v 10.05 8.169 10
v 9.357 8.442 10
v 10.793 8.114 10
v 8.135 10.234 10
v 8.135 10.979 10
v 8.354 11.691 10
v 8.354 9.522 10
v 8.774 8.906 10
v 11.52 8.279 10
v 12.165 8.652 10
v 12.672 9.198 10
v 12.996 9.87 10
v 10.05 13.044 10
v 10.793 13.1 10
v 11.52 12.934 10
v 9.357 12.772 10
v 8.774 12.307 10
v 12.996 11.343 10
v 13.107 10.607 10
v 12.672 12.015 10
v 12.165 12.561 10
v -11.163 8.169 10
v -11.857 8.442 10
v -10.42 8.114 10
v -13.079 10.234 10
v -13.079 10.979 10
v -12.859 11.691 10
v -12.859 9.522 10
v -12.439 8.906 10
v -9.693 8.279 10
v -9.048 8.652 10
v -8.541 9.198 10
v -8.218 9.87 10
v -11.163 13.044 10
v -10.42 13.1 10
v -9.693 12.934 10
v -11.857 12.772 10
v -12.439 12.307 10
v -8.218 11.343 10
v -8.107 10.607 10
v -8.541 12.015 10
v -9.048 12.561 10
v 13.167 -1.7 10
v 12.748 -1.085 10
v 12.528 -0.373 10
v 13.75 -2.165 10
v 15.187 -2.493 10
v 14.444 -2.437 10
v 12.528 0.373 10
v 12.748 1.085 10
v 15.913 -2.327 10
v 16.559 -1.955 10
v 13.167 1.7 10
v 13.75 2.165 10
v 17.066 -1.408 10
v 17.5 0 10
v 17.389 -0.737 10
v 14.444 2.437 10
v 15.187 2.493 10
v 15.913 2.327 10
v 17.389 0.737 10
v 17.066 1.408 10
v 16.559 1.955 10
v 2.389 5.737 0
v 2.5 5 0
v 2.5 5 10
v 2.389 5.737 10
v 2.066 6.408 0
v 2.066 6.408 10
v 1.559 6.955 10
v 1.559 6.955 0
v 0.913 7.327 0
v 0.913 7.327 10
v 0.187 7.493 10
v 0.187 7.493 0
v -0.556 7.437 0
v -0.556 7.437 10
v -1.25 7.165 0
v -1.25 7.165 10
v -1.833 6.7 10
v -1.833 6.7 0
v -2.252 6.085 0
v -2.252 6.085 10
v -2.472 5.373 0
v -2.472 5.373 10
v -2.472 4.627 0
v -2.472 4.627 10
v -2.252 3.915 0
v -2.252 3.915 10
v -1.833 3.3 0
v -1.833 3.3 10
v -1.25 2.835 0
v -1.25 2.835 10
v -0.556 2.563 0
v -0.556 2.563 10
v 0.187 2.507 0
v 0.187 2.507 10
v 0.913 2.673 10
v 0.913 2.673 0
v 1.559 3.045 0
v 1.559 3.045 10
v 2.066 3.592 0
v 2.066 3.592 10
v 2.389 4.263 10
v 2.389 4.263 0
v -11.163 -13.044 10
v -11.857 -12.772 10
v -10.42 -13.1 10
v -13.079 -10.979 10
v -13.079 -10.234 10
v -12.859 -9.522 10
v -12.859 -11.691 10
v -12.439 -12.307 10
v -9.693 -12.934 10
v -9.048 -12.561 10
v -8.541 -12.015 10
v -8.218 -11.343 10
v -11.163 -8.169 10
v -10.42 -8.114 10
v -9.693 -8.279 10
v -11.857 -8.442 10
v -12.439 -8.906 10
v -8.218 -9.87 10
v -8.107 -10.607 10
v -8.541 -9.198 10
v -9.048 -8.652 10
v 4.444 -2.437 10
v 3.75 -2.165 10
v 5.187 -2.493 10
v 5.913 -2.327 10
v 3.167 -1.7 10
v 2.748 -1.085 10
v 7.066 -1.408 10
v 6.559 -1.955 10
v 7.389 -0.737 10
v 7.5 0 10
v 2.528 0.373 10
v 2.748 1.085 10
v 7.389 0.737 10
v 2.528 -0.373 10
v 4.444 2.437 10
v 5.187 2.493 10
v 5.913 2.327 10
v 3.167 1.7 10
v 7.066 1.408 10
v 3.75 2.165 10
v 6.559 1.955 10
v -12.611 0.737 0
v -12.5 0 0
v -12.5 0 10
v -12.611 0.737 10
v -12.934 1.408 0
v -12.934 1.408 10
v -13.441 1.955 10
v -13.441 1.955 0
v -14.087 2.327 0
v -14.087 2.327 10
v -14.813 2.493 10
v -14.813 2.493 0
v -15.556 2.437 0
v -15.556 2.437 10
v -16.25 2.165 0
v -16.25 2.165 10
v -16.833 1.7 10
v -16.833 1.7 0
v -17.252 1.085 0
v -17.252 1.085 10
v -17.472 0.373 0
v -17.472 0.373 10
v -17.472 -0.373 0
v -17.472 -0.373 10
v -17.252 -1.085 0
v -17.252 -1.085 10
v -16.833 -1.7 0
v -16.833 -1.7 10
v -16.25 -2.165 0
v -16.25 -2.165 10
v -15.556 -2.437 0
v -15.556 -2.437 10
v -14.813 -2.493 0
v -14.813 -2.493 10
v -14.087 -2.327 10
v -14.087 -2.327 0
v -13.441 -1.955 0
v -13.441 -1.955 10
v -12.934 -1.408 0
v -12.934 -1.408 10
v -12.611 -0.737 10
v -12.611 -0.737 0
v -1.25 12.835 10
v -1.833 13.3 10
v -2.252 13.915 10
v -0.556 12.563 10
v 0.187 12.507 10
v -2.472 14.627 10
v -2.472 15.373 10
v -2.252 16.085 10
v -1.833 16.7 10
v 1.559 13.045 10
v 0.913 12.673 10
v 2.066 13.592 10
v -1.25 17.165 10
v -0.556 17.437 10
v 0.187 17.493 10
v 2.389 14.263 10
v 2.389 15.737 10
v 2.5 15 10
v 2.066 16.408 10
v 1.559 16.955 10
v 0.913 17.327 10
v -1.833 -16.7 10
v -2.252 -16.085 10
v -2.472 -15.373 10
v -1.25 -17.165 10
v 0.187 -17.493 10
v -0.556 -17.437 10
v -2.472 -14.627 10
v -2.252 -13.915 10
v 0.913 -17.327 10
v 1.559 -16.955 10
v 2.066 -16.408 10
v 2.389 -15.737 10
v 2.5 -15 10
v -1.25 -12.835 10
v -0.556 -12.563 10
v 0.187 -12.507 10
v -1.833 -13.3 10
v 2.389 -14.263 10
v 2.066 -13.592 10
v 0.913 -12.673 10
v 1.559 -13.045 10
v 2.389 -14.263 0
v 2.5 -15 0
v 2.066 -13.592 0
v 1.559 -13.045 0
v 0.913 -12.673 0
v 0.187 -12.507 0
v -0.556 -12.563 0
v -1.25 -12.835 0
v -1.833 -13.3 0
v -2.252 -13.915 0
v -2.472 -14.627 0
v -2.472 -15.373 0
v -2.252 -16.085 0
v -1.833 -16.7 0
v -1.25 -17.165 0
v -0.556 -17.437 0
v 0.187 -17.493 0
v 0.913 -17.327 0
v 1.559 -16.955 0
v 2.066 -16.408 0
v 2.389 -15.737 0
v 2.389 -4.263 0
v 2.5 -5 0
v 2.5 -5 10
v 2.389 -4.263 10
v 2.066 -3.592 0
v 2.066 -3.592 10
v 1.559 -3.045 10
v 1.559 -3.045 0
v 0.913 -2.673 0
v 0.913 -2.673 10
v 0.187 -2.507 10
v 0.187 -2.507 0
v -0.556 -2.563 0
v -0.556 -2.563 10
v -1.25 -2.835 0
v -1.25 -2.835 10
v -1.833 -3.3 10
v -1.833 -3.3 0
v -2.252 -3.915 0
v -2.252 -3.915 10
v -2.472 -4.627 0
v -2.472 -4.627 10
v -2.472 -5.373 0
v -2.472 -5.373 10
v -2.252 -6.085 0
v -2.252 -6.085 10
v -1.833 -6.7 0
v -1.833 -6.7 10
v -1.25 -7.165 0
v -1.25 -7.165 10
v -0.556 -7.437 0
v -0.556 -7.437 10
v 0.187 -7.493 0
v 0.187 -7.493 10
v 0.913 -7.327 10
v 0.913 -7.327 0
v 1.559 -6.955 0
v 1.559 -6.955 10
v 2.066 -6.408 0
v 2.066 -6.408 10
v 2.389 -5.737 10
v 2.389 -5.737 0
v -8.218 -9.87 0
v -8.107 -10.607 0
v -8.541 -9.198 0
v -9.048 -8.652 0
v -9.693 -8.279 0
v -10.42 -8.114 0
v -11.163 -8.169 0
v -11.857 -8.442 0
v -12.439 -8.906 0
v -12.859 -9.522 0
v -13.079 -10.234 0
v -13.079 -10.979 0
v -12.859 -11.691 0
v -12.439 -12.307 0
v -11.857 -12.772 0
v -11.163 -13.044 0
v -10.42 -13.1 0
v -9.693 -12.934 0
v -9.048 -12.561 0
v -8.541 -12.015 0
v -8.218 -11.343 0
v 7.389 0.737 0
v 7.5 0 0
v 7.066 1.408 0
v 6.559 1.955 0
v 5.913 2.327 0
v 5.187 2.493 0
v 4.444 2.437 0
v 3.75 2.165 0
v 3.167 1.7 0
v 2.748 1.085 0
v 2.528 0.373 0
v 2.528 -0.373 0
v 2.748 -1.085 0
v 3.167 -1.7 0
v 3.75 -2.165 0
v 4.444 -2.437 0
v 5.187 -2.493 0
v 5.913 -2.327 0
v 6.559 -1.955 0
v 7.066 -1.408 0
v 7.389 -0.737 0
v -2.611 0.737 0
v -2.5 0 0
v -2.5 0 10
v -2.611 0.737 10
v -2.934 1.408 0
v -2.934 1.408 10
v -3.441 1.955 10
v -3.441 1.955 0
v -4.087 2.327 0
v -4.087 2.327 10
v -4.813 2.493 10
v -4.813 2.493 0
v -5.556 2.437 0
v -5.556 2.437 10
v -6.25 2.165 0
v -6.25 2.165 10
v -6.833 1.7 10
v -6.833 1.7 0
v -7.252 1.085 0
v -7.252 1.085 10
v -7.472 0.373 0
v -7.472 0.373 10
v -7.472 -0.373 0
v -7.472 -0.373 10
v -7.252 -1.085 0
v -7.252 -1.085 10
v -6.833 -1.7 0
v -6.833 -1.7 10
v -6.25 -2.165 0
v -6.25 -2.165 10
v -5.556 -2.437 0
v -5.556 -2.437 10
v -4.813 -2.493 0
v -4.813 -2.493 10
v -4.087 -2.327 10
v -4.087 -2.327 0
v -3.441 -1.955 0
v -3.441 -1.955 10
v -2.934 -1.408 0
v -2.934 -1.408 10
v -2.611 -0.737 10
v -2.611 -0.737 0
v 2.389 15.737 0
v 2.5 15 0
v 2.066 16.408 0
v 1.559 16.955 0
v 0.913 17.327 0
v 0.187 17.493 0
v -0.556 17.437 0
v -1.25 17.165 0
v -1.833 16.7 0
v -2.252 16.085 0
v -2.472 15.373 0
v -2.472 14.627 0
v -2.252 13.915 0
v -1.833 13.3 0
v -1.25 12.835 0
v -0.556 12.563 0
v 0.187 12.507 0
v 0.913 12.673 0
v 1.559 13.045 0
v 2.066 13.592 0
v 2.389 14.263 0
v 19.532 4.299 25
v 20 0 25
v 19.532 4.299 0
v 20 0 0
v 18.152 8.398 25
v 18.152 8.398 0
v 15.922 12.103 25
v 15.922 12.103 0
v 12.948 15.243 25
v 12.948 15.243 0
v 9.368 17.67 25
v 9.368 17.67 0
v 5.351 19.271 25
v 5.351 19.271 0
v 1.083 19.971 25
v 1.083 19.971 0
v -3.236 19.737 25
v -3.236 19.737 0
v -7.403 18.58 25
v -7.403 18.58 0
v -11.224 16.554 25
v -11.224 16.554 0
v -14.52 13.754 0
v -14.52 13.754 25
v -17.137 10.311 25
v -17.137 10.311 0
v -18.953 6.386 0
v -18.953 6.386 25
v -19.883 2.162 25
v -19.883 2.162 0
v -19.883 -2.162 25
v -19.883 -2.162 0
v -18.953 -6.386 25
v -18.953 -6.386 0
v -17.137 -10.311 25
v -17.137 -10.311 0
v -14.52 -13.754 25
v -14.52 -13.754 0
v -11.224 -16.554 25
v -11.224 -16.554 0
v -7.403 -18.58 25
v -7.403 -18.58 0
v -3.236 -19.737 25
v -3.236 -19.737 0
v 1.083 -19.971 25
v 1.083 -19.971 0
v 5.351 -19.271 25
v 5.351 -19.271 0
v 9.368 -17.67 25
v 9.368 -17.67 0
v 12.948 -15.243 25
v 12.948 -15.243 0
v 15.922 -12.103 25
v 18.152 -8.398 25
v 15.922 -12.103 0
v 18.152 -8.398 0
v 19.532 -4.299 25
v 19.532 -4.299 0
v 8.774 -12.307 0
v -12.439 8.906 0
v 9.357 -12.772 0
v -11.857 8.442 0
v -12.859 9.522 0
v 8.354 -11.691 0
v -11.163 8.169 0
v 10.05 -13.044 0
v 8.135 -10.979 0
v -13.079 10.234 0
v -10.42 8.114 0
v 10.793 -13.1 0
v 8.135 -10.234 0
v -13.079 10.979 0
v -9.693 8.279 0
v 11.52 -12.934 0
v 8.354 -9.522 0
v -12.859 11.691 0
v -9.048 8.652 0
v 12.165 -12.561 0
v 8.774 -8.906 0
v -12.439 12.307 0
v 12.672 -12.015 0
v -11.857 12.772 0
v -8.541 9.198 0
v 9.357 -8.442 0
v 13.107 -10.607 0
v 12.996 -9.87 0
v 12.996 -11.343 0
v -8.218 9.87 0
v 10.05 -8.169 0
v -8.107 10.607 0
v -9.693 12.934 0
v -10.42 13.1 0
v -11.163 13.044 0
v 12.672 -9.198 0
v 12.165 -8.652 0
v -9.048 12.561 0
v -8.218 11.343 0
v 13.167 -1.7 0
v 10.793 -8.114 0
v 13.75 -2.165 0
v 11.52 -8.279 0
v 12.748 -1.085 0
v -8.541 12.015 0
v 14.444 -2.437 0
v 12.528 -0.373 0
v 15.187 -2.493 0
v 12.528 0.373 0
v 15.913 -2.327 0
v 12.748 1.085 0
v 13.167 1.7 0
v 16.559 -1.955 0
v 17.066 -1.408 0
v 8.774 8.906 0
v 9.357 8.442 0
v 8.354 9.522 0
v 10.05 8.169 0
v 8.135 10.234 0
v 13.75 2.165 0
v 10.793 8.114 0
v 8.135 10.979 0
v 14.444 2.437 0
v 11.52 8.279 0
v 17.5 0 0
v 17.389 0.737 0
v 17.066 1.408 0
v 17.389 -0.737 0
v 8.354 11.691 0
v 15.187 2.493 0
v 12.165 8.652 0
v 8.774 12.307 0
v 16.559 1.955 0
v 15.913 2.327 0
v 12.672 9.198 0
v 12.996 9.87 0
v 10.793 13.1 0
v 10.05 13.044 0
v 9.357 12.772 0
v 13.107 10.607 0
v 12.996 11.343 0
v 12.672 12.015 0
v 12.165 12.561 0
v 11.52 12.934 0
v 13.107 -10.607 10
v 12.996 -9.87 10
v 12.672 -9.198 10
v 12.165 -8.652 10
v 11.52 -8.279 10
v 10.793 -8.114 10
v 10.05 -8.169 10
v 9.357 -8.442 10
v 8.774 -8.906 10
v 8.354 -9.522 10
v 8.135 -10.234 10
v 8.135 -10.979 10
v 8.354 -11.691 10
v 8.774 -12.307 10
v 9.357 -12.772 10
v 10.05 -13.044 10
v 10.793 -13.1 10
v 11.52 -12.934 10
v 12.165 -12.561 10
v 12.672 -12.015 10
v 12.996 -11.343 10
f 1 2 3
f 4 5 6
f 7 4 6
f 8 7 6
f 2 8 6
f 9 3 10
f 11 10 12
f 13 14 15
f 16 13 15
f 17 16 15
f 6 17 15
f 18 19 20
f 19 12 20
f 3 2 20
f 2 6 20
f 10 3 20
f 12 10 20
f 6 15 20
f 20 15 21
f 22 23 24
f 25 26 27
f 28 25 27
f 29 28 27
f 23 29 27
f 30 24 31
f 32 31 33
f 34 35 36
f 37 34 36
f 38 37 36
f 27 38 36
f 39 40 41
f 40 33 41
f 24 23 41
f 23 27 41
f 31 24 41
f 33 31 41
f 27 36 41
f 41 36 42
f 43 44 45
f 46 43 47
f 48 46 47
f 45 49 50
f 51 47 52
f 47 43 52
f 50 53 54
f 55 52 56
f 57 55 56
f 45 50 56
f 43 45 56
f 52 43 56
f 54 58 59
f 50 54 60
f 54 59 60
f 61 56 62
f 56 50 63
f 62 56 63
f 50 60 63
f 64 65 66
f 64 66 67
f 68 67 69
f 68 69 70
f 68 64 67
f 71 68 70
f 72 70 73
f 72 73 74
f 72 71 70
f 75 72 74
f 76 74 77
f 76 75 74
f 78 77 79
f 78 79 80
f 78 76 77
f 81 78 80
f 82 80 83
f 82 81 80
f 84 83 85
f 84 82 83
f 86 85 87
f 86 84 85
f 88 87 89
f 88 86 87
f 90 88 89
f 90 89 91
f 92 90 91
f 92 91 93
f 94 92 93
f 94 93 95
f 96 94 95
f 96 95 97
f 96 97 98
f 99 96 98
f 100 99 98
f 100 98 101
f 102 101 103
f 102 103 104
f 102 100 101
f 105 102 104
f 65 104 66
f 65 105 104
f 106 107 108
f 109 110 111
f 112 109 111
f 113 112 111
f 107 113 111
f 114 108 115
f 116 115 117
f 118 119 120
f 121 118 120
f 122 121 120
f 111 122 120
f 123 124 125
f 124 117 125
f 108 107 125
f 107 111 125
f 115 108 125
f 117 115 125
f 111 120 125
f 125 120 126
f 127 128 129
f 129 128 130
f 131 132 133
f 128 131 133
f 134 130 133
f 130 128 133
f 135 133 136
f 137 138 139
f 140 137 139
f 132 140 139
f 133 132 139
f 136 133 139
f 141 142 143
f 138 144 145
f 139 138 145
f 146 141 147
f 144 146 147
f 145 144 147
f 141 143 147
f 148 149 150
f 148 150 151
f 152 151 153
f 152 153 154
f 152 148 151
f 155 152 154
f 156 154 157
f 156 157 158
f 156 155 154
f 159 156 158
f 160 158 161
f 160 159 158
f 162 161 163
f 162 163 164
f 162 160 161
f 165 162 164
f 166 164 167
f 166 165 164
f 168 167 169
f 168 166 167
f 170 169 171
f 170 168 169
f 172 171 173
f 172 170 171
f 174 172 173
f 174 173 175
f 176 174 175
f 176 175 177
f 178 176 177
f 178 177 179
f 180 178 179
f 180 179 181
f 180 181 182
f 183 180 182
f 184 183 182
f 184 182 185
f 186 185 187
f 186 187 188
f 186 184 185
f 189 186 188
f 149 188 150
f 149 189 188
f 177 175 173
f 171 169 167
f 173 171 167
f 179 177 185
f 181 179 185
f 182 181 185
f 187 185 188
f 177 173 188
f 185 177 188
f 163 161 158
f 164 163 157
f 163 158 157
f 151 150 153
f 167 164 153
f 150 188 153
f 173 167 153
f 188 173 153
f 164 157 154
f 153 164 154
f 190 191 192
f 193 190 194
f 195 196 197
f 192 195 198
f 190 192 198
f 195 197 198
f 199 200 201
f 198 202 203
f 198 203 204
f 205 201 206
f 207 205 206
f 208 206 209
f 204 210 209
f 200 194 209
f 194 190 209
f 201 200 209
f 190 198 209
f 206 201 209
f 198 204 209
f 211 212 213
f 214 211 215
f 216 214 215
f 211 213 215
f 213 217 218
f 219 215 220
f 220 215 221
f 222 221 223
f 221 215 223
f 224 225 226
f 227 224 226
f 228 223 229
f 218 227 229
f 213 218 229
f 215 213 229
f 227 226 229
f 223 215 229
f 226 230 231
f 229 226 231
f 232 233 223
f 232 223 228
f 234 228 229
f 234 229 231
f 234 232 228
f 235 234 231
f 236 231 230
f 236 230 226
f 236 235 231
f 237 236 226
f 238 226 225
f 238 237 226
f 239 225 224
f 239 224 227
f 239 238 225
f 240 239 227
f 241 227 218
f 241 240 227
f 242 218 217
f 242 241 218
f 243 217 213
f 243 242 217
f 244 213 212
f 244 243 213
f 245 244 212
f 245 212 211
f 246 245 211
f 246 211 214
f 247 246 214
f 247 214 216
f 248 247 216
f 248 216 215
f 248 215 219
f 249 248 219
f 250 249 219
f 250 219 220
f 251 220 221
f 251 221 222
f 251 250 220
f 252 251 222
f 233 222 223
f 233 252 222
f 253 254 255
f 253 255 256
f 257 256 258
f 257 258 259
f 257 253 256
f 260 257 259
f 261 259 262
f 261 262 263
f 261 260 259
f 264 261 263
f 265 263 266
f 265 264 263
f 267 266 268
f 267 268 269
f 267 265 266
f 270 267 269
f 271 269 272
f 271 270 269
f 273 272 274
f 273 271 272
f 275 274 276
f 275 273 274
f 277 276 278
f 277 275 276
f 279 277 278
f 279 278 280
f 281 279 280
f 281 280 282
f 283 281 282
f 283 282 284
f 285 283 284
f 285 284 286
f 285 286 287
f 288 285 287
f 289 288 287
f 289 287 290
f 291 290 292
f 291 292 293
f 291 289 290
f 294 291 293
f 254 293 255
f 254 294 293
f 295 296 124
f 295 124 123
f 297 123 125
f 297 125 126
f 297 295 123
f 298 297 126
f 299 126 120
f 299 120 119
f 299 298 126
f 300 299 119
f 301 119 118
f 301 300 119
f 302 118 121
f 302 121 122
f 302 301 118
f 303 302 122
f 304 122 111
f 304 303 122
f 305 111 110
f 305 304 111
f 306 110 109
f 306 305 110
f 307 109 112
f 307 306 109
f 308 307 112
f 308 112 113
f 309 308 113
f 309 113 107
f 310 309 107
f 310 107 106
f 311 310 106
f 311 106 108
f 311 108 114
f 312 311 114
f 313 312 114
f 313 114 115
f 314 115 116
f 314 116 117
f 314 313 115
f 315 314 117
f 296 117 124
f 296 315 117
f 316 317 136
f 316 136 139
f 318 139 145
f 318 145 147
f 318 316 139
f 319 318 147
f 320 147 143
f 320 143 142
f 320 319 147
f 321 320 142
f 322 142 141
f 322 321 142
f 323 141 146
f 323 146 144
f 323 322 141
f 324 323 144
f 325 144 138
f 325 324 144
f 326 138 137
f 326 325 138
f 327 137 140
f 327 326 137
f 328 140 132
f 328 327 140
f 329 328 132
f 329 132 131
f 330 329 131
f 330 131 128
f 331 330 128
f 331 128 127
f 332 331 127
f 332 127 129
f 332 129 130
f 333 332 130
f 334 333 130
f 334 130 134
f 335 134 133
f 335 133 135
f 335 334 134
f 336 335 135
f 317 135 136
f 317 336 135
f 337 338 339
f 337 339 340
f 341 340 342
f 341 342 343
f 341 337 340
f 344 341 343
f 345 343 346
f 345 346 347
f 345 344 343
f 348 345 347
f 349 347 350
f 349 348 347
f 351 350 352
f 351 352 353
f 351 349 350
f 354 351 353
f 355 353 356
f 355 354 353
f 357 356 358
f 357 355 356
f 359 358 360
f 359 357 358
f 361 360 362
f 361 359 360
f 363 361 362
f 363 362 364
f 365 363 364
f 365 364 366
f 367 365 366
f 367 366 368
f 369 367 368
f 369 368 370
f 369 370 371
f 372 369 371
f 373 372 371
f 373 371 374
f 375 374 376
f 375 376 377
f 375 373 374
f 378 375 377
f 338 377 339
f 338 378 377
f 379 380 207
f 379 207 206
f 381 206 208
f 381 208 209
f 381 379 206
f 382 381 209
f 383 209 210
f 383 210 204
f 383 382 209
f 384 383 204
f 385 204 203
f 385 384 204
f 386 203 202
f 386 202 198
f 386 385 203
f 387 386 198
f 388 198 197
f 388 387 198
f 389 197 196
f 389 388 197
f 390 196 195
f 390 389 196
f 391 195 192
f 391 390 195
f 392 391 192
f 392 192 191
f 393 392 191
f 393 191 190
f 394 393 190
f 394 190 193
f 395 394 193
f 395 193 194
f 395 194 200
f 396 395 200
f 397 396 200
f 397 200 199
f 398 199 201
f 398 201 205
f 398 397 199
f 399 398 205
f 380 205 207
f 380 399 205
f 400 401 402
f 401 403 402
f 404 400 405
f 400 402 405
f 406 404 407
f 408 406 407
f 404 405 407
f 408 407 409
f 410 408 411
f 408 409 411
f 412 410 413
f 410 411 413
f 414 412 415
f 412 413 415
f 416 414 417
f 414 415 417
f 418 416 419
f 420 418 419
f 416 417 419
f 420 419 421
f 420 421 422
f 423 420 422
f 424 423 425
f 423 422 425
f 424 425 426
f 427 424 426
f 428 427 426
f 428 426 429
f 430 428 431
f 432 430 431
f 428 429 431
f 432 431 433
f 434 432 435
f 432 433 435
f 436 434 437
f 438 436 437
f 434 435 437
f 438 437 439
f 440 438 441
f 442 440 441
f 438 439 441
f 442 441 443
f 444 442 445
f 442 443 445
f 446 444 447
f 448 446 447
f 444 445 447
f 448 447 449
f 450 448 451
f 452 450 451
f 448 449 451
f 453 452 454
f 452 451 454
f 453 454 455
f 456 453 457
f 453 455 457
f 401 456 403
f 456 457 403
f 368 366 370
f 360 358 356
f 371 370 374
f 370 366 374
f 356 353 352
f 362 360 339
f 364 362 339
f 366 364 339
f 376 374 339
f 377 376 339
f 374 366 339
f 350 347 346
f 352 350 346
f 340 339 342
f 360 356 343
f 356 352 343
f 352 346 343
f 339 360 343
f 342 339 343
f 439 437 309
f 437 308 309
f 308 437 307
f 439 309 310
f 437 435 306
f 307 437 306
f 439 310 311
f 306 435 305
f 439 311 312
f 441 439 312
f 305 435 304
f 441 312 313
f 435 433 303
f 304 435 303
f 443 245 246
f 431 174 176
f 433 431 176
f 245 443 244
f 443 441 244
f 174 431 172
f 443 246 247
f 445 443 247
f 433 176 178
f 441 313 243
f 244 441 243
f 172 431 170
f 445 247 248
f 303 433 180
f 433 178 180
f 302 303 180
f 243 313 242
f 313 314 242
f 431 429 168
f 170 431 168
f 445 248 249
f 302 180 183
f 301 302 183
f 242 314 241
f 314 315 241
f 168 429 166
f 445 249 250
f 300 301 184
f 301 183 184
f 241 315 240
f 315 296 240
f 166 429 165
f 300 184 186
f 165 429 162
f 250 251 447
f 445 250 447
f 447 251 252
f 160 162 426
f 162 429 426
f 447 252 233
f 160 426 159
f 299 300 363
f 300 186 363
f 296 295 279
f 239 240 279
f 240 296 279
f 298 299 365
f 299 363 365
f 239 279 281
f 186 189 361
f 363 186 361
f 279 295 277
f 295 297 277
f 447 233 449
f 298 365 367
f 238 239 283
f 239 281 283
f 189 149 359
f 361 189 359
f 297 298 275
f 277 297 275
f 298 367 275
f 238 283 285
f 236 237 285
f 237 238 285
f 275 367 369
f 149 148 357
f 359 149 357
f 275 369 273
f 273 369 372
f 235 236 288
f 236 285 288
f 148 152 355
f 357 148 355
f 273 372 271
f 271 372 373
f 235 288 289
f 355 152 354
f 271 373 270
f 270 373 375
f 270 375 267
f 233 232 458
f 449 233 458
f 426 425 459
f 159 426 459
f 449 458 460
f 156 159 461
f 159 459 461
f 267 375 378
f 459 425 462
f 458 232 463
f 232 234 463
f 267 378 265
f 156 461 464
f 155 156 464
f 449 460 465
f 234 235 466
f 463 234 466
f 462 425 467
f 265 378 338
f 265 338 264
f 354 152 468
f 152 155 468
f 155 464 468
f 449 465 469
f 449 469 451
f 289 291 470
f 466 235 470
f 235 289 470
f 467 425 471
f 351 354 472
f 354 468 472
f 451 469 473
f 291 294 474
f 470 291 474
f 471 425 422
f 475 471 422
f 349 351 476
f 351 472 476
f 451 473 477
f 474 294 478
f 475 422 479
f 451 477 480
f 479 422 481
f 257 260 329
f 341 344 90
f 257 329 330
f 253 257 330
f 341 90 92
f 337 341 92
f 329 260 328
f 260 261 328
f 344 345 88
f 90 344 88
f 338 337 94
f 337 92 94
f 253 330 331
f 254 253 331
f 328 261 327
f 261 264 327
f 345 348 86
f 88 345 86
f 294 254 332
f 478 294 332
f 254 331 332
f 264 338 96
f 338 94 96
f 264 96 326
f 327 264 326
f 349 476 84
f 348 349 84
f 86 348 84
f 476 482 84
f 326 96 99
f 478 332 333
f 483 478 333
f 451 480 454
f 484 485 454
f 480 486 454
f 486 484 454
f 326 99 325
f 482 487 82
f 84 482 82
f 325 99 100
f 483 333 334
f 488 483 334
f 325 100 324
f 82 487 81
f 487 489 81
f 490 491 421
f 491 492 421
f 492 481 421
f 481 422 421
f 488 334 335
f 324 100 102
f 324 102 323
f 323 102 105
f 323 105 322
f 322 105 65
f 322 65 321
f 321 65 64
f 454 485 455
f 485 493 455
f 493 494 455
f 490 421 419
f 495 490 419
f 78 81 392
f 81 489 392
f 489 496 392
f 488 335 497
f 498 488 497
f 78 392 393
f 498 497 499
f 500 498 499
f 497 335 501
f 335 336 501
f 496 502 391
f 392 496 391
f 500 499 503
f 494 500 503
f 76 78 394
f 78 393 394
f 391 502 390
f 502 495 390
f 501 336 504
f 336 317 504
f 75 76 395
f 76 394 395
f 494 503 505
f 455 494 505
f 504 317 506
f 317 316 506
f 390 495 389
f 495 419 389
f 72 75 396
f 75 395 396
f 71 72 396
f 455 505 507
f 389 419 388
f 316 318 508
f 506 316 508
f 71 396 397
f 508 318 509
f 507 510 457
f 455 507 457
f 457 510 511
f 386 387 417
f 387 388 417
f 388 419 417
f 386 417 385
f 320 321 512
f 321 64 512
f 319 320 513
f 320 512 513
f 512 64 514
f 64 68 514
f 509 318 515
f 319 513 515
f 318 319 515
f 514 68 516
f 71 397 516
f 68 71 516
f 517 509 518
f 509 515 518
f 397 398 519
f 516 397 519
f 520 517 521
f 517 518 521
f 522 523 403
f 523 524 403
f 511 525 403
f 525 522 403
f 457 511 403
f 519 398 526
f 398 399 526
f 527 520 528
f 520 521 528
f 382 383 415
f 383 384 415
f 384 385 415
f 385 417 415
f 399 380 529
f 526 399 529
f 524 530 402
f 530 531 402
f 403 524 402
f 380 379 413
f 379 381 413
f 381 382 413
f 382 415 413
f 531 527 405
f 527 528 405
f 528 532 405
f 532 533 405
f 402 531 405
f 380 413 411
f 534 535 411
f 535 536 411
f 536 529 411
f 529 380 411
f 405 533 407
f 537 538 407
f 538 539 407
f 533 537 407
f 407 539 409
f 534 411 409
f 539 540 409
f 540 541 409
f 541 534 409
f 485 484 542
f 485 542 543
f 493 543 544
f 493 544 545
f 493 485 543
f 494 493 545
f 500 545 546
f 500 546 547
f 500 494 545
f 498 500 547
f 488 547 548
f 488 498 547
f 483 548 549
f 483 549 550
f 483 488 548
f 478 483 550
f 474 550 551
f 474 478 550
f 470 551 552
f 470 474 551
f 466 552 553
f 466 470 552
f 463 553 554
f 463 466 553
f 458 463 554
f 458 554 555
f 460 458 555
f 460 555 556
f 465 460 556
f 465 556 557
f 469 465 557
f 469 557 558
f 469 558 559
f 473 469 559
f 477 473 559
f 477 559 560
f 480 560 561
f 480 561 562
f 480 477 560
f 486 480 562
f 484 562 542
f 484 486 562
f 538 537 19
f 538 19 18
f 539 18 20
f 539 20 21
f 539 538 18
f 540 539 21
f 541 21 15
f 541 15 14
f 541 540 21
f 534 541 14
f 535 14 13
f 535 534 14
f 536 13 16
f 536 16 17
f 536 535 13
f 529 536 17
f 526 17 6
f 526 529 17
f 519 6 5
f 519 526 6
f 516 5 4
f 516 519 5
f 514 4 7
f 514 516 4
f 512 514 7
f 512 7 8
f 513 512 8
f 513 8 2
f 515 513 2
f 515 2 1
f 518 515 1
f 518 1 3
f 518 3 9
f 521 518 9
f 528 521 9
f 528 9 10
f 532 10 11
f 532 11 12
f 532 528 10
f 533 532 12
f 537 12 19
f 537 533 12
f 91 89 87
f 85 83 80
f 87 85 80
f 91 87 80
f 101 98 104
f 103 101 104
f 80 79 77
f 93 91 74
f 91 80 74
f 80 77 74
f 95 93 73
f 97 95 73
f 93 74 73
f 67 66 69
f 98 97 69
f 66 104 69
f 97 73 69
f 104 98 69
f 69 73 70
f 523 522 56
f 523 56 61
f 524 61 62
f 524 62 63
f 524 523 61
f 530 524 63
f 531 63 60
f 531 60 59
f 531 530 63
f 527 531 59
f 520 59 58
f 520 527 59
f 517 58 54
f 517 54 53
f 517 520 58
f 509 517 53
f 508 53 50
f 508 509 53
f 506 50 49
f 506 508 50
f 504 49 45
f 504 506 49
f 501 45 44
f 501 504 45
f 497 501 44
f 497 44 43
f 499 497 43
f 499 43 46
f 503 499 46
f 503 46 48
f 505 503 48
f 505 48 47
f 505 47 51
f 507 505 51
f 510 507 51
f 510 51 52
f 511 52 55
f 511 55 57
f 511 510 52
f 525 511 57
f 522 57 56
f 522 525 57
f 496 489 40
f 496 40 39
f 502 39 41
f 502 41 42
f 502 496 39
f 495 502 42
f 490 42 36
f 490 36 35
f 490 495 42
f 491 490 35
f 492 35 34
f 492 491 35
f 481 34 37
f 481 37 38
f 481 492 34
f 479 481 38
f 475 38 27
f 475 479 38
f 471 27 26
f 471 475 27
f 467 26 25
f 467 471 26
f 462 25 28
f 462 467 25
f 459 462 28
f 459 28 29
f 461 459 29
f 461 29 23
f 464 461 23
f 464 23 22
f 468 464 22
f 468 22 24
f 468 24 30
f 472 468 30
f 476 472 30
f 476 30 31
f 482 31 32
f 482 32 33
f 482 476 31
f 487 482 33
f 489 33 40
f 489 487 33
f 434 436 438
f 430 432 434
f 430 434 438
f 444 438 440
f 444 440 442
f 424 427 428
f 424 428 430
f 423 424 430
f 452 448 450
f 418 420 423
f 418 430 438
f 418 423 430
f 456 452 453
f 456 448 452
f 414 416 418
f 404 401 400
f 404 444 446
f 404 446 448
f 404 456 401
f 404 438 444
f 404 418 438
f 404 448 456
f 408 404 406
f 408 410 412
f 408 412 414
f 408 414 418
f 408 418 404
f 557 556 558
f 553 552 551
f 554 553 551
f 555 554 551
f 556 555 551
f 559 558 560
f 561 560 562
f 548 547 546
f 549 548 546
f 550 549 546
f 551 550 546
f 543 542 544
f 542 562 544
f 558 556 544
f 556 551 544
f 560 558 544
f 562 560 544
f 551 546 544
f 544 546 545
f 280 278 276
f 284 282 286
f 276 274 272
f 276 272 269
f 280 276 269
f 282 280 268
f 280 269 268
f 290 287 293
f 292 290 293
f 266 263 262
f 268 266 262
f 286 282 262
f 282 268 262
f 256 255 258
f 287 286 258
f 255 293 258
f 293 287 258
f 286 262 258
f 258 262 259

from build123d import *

# Parameters (mm, degrees)
SKETCH1_R           = 20
SKETCH1_R_2         = 2.5
BOSS_EXTRUDE1_DEPTH = 10
SKETCH2_R           = 20
BOSS_EXTRUDE2_DEPTH = 15


with BuildPart() as part:
    # Sketch1 → Boss-Extrude1 (new body)
    with BuildSketch(Plane.XY):
        Circle(SKETCH1_R)
        with Locations((0, 15)):
            Circle(SKETCH1_R_2, mode=Mode.SUBTRACT)
        with Locations((10.606601718, 10.606601718)):
            Circle(SKETCH1_R_2, mode=Mode.SUBTRACT)
        with Locations((15, 0)):
            Circle(SKETCH1_R_2, mode=Mode.SUBTRACT)
        with Locations((10.606601718, -10.606601718)):
            Circle(SKETCH1_R_2, mode=Mode.SUBTRACT)
        with Locations((0, -15)):
            Circle(SKETCH1_R_2, mode=Mode.SUBTRACT)
        with Locations((-10.606601718, -10.606601718)):
            Circle(SKETCH1_R_2, mode=Mode.SUBTRACT)
        with Locations((-15, 0)):
            Circle(SKETCH1_R_2, mode=Mode.SUBTRACT)
        with Locations((-10.606601718, 10.606601718)):
            Circle(SKETCH1_R_2, mode=Mode.SUBTRACT)
        with Locations((0, 5)):
            Circle(SKETCH1_R_2, mode=Mode.SUBTRACT)
        with Locations((5, 0)):
            Circle(SKETCH1_R_2, mode=Mode.SUBTRACT)
        with Locations((0, -5)):
            Circle(SKETCH1_R_2, mode=Mode.SUBTRACT)
        with Locations((-5, 0)):
            Circle(SKETCH1_R_2, mode=Mode.SUBTRACT)
    extrude(amount=BOSS_EXTRUDE1_DEPTH)

    # Sketch2 → Boss-Extrude2 (add)
    with BuildSketch(Plane.XY.offset(10)):
        Circle(SKETCH2_R)
    extrude(amount=BOSS_EXTRUDE2_DEPTH)


solid = part.part
